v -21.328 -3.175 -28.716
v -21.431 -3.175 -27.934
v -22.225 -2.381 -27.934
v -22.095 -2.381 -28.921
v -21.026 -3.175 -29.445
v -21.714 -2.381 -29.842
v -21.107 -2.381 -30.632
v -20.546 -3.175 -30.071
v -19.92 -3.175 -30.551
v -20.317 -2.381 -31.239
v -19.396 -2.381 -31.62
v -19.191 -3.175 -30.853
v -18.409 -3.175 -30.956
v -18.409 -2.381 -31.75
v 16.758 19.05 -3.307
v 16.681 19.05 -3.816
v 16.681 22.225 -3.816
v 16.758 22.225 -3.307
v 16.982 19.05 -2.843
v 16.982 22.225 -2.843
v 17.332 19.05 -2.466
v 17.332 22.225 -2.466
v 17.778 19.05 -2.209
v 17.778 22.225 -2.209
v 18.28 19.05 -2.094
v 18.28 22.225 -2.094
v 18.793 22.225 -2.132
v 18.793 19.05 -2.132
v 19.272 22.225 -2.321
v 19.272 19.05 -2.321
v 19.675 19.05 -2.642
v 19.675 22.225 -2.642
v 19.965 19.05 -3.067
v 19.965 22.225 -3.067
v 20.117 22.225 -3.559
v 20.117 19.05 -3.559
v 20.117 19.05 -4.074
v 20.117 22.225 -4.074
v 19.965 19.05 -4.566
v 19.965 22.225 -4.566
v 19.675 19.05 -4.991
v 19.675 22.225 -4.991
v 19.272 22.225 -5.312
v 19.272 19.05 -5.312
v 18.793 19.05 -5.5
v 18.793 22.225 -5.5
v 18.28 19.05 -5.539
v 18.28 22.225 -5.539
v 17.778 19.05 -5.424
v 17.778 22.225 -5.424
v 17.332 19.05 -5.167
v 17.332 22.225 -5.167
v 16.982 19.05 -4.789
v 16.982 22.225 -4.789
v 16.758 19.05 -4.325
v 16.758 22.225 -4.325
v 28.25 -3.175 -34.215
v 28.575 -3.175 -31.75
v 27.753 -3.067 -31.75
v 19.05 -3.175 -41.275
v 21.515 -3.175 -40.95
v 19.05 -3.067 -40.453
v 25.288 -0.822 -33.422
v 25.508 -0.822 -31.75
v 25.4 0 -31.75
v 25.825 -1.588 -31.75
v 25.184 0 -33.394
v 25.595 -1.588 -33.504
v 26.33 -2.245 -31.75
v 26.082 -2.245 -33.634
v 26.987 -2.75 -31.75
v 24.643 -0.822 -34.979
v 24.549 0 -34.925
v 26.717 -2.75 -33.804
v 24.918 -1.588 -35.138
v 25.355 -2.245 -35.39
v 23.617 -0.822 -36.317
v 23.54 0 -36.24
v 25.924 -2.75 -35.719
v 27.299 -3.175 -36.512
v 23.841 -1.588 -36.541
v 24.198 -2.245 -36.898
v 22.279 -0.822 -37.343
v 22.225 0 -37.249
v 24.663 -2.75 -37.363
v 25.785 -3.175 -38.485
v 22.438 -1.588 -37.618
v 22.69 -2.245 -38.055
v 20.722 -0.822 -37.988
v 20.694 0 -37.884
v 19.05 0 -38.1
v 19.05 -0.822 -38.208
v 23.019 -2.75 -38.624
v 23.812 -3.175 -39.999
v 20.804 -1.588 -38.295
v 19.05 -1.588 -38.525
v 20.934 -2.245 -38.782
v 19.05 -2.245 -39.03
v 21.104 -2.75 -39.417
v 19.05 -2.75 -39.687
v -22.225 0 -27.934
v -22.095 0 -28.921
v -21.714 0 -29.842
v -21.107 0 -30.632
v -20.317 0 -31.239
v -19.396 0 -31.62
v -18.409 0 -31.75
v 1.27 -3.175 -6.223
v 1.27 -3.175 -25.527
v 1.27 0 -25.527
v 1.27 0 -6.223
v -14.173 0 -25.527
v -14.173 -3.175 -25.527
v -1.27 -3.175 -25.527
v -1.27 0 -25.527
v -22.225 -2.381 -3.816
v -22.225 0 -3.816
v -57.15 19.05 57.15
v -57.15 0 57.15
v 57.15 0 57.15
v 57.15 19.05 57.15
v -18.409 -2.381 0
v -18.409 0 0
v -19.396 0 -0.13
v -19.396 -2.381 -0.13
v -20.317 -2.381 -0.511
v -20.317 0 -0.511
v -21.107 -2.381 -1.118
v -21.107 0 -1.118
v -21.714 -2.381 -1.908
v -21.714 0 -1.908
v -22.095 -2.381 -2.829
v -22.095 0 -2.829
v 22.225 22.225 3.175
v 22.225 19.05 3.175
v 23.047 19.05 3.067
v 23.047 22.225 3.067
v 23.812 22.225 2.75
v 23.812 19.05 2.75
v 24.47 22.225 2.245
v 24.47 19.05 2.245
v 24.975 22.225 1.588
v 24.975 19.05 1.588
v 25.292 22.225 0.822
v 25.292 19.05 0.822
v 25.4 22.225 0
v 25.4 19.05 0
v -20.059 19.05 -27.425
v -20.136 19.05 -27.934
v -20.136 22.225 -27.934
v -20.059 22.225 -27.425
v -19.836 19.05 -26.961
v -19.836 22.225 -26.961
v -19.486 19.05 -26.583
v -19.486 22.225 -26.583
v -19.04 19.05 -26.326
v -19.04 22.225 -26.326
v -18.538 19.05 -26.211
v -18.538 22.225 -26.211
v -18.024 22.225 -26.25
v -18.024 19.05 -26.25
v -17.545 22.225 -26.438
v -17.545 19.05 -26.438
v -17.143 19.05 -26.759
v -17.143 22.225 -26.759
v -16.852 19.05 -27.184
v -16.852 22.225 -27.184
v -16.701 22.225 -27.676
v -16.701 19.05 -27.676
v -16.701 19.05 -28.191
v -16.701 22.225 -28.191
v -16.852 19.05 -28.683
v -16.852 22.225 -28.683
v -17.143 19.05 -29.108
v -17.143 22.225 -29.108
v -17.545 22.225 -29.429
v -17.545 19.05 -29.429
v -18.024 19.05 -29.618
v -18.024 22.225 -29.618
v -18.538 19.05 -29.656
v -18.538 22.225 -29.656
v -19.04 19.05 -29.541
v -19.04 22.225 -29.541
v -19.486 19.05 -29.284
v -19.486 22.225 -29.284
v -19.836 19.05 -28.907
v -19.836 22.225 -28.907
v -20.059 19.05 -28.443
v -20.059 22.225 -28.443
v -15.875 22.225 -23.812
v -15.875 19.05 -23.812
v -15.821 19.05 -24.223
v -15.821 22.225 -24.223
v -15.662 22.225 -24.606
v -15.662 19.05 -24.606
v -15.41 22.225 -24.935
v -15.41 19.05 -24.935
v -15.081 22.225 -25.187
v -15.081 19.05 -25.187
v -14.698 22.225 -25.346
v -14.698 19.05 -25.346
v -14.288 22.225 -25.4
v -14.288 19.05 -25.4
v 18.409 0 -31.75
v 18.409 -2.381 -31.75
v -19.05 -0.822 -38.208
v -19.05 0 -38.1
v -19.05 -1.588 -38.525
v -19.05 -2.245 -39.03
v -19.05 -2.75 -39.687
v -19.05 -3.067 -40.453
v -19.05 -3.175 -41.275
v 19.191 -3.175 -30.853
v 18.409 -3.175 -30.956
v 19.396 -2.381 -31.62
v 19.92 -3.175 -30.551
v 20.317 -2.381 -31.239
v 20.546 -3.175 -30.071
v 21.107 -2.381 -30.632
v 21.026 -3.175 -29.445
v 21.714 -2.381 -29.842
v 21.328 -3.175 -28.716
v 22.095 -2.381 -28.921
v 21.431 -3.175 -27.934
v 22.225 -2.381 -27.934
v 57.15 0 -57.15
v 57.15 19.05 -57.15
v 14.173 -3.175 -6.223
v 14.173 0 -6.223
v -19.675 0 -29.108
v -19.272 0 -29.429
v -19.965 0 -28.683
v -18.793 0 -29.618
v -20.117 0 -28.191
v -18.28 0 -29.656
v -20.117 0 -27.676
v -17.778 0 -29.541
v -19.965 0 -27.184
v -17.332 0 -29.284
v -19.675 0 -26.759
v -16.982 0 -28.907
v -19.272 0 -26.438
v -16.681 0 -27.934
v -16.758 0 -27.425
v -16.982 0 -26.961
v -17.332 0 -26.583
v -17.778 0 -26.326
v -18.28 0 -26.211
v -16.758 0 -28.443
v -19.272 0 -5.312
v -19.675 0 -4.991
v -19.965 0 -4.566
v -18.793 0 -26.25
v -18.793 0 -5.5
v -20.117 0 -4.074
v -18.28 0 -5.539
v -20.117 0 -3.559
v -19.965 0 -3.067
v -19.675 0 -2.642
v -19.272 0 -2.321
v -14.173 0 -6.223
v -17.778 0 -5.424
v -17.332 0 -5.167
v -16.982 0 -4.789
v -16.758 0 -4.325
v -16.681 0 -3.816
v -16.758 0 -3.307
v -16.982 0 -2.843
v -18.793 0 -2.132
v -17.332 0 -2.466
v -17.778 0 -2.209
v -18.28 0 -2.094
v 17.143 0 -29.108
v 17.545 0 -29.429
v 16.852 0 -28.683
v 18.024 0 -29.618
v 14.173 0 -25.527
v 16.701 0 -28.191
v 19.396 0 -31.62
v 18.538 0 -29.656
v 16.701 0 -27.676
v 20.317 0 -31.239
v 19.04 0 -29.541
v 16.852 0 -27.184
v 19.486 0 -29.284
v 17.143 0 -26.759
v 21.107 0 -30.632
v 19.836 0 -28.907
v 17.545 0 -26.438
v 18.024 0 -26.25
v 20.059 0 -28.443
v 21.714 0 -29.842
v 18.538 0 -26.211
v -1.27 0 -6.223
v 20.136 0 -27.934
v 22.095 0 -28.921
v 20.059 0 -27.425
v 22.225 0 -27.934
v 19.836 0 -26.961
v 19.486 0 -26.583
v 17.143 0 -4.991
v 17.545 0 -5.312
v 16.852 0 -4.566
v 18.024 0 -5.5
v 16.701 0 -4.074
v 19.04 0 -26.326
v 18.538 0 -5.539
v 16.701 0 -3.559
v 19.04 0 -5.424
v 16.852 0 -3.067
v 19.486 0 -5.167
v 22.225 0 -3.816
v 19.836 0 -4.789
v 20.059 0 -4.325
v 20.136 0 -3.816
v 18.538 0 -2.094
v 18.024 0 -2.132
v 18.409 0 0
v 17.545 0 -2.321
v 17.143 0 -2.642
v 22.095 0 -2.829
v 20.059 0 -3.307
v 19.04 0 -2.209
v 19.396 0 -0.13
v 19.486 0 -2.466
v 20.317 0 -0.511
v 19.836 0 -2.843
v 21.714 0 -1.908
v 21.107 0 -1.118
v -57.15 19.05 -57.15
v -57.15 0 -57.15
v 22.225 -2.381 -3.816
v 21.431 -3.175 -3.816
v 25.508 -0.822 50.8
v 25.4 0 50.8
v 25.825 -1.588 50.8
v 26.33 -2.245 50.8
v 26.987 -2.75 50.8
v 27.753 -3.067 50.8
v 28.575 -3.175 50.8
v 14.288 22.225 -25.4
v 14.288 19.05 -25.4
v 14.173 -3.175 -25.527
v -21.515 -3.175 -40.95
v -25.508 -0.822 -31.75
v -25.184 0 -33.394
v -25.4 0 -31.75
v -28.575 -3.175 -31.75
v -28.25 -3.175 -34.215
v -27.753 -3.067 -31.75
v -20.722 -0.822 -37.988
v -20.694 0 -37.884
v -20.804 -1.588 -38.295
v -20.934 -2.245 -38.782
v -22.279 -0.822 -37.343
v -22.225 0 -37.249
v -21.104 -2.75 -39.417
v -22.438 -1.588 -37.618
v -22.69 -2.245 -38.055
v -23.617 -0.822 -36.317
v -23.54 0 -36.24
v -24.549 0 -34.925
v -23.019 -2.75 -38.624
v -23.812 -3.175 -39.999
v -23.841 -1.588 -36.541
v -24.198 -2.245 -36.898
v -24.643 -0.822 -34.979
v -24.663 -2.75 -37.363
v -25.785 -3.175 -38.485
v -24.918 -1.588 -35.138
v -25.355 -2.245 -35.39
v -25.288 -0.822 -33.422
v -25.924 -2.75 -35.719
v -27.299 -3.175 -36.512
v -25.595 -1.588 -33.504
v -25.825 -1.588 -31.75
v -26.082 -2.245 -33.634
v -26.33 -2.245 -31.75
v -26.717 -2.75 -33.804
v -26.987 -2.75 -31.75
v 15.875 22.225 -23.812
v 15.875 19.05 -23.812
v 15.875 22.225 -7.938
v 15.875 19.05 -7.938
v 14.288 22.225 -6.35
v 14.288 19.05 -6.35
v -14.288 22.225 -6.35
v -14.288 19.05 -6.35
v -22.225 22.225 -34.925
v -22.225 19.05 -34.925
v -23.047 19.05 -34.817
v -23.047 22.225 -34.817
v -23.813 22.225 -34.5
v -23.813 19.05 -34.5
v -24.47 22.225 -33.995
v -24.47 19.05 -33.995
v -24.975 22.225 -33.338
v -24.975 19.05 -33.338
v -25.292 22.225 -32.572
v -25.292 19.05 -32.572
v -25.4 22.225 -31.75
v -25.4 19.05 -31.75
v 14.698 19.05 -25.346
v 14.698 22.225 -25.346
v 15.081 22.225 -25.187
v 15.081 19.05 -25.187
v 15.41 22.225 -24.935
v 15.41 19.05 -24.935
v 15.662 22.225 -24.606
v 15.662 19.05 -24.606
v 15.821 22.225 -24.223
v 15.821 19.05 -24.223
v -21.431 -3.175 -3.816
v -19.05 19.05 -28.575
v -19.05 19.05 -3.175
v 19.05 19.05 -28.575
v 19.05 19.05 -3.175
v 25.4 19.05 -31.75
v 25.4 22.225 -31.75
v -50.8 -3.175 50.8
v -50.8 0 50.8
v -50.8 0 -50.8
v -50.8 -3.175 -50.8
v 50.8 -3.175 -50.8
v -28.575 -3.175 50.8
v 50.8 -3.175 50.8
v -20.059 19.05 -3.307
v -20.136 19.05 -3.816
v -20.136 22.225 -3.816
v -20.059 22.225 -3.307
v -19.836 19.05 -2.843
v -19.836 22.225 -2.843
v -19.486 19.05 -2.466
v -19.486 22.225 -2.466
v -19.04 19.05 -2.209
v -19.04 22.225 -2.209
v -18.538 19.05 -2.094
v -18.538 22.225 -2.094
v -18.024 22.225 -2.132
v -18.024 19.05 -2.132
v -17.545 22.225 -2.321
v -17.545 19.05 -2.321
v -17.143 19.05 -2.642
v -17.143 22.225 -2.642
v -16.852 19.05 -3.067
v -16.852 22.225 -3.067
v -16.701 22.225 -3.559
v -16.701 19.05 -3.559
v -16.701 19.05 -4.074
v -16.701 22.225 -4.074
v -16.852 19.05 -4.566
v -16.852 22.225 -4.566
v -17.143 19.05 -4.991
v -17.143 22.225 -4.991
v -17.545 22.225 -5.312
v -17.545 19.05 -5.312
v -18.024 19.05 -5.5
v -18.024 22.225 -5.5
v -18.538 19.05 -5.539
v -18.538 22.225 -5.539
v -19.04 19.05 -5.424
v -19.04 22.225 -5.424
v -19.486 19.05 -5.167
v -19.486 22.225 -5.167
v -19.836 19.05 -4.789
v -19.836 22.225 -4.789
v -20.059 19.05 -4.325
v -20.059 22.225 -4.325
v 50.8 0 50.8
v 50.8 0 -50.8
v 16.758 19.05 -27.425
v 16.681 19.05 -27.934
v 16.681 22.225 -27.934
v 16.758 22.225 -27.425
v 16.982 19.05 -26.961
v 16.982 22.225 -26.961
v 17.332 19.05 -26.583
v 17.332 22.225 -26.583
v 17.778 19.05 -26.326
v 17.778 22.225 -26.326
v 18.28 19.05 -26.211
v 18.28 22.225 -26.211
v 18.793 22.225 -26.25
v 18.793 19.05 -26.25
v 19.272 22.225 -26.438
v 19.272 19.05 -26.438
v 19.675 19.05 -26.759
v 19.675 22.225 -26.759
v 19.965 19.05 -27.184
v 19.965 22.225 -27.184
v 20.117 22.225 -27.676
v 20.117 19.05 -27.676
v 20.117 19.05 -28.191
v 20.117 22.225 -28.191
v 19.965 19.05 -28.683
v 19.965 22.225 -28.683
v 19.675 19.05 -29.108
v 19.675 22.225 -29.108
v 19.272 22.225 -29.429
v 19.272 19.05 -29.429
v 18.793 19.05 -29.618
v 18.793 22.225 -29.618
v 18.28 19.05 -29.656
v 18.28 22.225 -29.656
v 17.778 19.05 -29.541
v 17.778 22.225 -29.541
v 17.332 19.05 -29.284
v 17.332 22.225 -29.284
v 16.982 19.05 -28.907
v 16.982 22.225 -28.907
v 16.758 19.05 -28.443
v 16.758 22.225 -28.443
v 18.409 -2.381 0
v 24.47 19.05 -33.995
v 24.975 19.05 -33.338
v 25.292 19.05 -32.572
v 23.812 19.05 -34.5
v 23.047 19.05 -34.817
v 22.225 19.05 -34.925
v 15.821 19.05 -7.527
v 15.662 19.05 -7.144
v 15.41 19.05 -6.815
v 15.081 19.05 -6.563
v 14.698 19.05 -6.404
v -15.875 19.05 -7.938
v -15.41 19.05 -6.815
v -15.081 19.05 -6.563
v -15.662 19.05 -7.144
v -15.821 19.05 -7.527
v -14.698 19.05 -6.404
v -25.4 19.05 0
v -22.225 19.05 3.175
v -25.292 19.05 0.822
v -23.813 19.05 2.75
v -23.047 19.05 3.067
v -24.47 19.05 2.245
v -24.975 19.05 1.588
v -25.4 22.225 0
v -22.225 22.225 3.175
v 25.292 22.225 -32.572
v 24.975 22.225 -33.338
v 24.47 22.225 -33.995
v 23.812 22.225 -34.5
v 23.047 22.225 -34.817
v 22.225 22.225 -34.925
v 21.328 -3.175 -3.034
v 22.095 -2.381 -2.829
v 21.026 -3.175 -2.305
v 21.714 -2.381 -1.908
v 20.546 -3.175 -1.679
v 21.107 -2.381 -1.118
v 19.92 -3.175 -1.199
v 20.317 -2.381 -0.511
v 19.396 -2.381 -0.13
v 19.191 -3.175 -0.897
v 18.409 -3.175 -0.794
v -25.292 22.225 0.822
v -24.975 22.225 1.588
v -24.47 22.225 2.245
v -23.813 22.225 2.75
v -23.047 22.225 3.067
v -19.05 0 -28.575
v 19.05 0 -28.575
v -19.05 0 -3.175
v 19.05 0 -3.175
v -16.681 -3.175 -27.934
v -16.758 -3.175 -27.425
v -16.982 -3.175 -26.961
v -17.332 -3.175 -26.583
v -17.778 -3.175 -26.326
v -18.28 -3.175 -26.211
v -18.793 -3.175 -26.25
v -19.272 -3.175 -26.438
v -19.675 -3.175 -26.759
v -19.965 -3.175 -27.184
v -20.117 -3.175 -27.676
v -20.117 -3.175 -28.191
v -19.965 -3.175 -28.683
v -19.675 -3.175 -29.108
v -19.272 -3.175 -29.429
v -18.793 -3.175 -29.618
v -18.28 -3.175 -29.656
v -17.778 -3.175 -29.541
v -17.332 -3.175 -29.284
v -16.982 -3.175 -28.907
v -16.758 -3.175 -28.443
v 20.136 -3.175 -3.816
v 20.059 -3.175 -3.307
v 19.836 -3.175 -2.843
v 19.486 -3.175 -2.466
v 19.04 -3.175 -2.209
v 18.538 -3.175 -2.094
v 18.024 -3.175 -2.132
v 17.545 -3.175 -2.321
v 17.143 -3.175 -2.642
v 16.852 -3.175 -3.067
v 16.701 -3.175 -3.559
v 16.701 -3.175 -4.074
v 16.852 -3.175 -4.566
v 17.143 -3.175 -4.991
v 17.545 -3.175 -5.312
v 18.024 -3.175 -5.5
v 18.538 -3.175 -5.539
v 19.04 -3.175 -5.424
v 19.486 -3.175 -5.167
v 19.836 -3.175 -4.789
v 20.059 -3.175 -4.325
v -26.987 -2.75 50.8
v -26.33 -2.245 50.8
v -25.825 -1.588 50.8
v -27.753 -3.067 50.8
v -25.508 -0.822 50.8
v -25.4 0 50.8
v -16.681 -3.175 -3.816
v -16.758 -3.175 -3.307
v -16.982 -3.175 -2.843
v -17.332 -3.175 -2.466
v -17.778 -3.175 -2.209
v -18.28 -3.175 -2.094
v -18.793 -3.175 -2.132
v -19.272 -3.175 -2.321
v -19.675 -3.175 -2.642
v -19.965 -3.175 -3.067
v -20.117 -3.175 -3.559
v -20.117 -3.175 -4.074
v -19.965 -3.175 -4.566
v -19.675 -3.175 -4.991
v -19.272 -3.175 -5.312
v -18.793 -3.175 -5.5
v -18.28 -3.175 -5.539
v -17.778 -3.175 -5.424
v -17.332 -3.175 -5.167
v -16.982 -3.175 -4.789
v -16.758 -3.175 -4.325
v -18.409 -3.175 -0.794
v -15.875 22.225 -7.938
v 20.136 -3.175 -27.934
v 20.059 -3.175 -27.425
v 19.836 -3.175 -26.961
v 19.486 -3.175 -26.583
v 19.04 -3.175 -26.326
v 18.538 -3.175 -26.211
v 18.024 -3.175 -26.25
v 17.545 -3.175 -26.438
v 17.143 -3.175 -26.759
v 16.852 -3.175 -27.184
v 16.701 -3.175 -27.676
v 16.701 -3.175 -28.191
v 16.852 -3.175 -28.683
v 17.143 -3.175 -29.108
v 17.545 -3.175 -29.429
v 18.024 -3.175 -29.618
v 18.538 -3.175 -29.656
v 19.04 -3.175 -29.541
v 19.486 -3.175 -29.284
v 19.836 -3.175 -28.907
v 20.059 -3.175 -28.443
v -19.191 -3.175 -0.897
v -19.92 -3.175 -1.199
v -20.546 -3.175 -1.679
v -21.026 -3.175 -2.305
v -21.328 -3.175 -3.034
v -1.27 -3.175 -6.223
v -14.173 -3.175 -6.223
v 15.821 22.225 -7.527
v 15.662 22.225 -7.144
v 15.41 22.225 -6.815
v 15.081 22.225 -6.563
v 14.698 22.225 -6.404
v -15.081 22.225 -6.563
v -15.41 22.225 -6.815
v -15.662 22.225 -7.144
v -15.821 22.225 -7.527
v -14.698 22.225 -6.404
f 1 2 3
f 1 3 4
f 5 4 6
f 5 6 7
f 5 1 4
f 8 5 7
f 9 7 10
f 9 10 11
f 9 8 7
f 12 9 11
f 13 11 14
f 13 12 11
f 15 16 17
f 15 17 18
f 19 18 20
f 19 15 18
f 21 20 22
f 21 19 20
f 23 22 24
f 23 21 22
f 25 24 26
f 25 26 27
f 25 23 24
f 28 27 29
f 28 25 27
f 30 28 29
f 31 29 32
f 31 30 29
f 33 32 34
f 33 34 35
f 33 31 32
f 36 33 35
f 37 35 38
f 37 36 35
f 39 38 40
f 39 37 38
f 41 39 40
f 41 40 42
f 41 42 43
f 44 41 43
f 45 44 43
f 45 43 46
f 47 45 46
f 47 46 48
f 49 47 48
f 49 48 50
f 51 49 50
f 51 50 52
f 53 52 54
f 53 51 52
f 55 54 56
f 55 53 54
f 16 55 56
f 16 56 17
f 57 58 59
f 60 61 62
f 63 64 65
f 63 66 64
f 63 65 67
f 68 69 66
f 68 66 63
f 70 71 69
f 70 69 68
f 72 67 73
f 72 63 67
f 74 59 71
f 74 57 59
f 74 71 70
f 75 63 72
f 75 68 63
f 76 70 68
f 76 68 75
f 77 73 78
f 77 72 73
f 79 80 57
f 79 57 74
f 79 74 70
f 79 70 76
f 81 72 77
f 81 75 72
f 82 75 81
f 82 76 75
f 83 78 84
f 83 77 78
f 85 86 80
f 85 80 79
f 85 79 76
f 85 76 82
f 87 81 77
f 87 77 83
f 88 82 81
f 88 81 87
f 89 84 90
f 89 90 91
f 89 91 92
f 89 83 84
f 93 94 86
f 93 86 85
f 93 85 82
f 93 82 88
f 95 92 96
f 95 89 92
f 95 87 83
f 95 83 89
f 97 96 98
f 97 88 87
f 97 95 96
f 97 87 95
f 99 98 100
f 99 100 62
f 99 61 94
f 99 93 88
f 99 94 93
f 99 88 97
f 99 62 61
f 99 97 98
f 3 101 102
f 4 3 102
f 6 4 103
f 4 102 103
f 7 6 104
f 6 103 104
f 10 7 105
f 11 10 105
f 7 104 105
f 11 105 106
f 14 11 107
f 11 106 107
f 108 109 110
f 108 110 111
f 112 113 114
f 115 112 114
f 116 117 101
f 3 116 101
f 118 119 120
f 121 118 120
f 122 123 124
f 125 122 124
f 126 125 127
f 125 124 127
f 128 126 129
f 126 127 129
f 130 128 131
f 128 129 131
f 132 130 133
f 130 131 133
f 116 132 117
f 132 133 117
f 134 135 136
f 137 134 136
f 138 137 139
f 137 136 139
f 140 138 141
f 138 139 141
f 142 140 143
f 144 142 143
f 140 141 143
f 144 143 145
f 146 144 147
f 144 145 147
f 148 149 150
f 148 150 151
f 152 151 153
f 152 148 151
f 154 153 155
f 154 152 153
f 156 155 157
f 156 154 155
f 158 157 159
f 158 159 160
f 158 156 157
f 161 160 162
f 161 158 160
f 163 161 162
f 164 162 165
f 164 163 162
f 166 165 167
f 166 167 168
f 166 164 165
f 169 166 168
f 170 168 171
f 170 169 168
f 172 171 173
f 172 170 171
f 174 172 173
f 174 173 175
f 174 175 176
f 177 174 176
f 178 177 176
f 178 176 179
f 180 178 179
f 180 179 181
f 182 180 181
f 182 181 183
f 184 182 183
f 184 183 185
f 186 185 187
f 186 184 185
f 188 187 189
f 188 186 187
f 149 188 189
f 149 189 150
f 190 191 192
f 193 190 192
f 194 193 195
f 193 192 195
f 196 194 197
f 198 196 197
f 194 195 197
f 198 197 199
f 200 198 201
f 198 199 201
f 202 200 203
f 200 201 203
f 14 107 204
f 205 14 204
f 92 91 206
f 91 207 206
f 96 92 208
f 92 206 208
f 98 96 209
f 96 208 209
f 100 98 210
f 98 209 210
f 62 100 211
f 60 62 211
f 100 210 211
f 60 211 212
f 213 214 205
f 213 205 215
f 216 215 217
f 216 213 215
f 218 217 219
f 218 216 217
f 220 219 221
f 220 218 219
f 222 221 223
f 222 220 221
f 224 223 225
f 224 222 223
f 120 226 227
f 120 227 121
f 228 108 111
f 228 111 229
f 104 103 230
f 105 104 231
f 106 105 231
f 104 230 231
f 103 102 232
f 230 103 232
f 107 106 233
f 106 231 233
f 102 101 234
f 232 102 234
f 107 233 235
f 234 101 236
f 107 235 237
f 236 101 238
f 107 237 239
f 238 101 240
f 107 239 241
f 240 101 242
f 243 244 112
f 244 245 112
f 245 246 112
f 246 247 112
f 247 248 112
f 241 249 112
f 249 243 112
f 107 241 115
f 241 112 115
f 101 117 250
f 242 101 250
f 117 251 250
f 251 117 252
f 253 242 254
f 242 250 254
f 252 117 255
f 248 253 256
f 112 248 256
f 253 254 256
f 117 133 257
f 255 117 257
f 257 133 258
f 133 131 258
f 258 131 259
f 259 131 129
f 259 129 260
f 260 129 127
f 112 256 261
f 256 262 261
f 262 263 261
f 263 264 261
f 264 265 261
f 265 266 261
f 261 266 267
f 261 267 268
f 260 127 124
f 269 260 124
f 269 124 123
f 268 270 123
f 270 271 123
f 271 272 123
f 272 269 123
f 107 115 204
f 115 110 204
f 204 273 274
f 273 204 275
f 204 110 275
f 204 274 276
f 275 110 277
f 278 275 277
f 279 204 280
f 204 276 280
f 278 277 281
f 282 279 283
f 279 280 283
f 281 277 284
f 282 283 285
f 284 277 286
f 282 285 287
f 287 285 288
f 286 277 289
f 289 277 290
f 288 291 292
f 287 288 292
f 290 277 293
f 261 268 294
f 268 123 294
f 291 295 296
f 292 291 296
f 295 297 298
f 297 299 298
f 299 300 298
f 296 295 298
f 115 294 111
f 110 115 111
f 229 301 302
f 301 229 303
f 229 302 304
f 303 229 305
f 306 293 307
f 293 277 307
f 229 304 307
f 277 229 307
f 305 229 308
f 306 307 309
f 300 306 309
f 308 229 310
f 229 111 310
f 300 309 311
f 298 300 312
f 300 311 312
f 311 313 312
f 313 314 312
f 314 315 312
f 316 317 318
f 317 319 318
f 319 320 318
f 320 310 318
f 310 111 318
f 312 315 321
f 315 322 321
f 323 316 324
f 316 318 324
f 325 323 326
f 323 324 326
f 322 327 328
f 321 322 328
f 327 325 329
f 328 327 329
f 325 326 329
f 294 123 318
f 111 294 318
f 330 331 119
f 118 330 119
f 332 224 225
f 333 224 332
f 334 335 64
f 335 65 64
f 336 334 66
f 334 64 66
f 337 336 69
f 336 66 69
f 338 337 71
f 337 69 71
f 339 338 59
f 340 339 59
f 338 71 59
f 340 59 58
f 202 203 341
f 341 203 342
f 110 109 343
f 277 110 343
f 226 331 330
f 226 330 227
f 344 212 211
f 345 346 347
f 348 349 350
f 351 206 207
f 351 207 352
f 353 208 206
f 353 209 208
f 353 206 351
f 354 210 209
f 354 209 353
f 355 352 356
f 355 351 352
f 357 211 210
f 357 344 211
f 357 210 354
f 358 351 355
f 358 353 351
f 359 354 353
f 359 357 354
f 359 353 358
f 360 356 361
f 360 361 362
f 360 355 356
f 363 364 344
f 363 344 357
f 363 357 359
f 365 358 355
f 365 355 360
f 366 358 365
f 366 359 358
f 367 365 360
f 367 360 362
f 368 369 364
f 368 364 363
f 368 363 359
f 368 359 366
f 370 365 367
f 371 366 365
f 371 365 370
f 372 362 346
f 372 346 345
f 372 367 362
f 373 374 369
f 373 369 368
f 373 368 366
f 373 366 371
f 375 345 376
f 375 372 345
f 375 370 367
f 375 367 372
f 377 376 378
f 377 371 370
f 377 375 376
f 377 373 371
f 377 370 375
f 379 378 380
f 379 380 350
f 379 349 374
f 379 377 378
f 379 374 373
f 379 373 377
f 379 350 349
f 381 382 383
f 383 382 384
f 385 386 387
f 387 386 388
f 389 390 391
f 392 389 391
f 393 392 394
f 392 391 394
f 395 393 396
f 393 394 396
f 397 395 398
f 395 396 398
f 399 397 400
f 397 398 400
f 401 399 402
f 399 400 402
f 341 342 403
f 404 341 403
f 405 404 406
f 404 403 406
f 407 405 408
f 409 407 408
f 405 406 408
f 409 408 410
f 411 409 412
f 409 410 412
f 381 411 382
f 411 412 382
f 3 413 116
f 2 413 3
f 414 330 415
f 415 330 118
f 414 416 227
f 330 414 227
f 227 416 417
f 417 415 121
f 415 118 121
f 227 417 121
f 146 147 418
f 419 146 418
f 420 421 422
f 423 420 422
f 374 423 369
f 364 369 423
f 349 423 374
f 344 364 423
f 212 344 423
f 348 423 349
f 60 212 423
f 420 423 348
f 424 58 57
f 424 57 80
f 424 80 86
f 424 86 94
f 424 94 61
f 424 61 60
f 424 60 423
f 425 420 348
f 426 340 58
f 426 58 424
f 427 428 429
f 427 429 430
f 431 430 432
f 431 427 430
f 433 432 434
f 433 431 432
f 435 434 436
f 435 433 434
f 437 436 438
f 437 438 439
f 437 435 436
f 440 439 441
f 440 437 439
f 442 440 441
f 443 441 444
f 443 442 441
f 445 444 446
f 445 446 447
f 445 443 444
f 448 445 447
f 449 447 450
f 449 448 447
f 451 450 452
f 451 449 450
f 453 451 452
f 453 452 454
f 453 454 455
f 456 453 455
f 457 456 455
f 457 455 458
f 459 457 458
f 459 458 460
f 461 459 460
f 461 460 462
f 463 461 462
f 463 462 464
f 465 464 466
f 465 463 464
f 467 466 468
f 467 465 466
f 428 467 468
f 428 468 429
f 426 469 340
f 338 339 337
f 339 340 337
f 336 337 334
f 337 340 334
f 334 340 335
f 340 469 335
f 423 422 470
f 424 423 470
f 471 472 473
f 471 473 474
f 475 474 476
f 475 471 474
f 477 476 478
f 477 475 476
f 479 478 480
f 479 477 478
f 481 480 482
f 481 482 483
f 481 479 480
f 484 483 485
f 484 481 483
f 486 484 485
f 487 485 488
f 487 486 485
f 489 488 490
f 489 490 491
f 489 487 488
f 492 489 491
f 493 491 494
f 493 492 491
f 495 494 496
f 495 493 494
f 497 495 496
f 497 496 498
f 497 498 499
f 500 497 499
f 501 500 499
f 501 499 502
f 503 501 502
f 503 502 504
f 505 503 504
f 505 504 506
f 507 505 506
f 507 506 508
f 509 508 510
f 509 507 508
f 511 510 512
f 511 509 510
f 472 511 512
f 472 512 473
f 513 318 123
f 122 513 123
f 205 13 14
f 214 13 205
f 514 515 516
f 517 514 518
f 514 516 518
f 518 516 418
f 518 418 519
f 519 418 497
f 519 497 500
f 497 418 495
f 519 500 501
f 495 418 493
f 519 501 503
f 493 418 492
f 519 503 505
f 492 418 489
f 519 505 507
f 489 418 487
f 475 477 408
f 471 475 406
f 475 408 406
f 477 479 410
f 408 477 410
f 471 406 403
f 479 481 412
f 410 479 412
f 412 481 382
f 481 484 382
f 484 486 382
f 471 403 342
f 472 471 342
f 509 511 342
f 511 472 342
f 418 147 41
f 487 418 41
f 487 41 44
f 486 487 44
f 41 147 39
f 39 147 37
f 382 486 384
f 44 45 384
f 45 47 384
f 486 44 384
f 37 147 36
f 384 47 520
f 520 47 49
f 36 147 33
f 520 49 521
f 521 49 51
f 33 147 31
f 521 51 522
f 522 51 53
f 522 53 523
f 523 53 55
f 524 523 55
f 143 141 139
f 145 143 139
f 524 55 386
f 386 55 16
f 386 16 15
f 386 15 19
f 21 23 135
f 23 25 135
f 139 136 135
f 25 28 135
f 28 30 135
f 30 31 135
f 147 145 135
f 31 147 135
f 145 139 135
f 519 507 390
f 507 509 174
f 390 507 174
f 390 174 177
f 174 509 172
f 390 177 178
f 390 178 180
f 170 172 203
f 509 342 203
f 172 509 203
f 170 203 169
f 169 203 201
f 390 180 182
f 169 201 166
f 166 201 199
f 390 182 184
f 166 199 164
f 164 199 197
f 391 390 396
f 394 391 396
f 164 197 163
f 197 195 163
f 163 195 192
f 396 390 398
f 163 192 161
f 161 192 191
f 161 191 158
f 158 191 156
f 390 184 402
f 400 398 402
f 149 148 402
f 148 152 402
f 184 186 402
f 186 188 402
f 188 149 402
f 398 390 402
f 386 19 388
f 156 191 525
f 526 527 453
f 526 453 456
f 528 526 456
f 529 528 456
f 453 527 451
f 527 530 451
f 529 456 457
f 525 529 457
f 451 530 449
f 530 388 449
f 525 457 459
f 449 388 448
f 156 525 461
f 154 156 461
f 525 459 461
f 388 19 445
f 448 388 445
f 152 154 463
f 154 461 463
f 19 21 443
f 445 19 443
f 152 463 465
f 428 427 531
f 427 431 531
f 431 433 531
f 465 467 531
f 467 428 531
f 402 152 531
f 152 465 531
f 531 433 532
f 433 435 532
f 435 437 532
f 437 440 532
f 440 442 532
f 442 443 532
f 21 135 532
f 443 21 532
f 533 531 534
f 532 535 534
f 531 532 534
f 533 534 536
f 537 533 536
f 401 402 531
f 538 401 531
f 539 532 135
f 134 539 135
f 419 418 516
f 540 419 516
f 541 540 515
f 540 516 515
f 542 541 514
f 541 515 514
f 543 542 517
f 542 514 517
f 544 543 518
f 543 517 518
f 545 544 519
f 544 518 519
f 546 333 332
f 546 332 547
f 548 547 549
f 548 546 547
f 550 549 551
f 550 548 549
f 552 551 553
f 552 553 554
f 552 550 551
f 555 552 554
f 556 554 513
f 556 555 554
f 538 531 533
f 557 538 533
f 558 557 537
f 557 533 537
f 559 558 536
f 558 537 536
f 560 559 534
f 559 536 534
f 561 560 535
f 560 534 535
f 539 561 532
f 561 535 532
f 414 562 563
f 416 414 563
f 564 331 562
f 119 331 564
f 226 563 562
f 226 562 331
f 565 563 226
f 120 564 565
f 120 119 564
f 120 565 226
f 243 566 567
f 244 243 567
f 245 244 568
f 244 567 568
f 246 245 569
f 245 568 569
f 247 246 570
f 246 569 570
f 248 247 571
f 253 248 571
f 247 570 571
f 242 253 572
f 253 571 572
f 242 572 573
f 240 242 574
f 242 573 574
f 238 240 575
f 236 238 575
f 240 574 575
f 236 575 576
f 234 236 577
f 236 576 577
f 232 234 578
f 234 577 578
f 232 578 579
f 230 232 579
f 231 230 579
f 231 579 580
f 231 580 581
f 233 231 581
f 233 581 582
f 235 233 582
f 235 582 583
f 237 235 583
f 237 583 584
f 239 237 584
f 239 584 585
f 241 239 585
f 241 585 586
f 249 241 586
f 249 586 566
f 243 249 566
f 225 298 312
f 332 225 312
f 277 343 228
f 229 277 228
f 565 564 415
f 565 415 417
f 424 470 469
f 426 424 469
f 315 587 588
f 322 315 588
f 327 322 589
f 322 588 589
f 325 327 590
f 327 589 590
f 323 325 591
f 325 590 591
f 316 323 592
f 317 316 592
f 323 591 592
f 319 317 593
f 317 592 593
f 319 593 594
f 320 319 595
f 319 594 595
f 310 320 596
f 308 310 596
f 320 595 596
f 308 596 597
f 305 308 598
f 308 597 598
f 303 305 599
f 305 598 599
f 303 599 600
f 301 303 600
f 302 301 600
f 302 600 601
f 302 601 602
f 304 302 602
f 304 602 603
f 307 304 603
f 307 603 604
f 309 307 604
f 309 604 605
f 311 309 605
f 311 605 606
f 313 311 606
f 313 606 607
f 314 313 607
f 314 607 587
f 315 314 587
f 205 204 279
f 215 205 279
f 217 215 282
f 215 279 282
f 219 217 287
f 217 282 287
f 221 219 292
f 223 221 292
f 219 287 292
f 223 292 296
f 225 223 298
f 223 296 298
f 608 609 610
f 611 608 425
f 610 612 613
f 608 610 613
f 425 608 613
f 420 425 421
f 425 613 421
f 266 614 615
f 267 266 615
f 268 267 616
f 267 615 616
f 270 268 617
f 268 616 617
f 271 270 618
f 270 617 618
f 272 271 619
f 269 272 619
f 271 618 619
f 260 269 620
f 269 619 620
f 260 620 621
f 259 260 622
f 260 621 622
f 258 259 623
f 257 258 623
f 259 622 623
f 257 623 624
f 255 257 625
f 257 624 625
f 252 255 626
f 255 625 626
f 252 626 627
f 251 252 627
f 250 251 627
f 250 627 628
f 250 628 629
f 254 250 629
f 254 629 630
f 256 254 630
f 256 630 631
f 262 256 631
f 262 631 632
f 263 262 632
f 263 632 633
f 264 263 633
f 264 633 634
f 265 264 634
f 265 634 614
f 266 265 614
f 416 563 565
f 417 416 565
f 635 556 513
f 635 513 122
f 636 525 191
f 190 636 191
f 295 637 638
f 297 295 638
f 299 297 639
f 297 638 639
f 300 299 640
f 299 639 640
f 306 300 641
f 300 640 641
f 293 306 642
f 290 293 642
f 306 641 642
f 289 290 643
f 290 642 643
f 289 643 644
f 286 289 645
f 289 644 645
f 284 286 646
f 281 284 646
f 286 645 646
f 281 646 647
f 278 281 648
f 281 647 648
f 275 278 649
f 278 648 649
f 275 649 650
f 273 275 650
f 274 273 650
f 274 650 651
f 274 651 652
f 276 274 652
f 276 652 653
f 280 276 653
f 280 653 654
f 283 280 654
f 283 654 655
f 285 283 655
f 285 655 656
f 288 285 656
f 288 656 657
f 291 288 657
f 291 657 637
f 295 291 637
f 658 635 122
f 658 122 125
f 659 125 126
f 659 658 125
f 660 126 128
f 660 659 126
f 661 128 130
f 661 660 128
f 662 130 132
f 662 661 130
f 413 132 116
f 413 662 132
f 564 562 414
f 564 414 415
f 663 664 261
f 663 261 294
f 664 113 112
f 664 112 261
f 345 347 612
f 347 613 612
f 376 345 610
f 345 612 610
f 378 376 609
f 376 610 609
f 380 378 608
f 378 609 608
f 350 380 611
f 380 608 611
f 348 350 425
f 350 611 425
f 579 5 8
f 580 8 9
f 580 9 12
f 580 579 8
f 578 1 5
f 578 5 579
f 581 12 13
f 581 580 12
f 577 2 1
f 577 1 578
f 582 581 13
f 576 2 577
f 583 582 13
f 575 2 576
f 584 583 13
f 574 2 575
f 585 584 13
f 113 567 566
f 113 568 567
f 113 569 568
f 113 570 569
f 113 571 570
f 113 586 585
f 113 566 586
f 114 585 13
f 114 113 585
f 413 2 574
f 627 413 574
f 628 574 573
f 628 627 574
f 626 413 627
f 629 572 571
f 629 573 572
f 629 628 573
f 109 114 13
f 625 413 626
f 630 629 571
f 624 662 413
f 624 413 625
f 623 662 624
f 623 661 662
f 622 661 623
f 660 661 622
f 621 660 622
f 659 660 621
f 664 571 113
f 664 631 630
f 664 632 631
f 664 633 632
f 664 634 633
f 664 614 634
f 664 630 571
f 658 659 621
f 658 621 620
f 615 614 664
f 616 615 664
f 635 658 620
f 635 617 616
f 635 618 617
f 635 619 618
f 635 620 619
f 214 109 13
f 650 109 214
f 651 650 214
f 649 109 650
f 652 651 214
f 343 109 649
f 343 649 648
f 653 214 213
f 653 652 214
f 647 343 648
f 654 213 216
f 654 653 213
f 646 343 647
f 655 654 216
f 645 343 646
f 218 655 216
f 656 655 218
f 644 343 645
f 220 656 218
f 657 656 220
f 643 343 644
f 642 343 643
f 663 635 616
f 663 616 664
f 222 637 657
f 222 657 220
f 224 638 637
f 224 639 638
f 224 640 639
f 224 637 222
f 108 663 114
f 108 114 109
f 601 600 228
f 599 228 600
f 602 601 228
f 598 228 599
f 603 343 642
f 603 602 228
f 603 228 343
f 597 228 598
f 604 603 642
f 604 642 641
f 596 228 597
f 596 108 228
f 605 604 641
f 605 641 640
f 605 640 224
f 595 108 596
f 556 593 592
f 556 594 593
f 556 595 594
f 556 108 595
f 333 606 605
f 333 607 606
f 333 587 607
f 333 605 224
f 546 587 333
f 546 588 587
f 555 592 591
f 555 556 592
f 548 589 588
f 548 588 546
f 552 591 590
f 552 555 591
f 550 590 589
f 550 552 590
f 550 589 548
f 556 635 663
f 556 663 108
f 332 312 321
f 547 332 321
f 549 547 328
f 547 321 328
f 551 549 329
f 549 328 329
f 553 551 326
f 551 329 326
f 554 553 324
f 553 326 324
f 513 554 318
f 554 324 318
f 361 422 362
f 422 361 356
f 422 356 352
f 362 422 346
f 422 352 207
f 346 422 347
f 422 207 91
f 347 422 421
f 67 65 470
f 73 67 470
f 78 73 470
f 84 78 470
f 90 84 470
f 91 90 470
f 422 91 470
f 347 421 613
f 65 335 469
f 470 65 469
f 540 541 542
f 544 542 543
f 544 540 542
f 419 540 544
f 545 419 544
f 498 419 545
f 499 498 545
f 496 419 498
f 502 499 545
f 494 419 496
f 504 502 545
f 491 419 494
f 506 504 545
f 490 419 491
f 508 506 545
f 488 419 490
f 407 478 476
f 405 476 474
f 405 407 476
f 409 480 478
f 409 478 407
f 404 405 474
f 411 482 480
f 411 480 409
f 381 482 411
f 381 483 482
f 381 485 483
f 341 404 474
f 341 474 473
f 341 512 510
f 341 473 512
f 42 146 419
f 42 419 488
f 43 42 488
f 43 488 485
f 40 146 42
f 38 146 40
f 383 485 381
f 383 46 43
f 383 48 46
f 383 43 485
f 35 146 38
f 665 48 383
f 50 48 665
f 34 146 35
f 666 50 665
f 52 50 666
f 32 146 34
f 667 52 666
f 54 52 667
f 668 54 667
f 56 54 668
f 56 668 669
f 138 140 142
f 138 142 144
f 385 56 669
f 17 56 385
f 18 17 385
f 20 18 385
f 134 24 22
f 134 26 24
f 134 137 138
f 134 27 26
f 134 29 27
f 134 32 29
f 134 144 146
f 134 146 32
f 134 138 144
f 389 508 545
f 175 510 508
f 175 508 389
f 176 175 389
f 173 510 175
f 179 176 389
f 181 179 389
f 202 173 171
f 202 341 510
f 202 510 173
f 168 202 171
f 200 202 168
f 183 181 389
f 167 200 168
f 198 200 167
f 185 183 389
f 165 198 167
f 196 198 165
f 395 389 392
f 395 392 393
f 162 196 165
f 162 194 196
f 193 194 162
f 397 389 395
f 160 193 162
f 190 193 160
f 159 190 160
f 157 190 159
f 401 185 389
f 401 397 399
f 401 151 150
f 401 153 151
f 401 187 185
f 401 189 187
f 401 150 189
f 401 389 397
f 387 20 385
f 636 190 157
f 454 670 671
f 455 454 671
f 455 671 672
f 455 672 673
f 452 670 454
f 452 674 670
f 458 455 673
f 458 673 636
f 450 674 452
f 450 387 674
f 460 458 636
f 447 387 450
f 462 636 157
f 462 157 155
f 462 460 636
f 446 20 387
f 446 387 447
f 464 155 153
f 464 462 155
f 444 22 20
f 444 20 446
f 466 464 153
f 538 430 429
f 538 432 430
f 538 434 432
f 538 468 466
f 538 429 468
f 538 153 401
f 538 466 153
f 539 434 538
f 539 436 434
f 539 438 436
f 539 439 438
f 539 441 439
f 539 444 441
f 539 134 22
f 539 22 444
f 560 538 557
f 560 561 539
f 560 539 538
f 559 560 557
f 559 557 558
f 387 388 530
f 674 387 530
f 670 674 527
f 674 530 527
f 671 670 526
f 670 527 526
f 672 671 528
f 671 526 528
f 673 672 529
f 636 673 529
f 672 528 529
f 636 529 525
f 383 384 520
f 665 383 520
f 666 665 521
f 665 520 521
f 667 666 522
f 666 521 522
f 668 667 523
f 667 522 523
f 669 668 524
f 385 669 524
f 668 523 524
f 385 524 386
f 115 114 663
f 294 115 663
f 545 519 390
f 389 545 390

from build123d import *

# Parameters (mm, degrees)
F0_W      = 114.3
F0_H      = 114.3
F1_DEPTH  = 19.05
F3_DEPTH  = 3.175
F4_R      = 3.17499
F5_W      = 38.1
F5_H      = 25.4
F6_DEPTH  = 19.051
F8_DEPTH  = 3.175
F9_SIZE   = 0.79375
F10_W     = 12.9032
F10_H     = 19.304
F11_DEPTH = 22.226
F12_R     = 1.7272
F13_DEPTH = 22.226
F14_R     = 1.7272
F15_DEPTH = 3.175


# Not quite as in the source:
# - a fillet or chamfer is up to 0.001 mm smaller than in the source, because OpenCascade refuses the exact size


with BuildPart() as f1:
    # F0 (on Front) → F1 (new body)
    with BuildSketch(Plane.XZ):
        Rectangle(F0_W, F0_H)
    extrude(amount=-F1_DEPTH)

    # F5 (on Front) → F6 (cut, through all)
    with BuildSketch(Plane.XZ):
        with Locations((0, -15.875)):
            Rectangle(F5_W, F5_H)
    extrude(amount=-F6_DEPTH, mode=Mode.SUBTRACT)


with BuildPart() as f3:
    # F2 (on Front) → F3 (new body)
    with BuildSketch(Plane.XZ):
        with BuildLine():
            Line((-50.8, 50.8), (-50.8, -50.8))
            Line((-50.8, -50.8), (50.8, -50.8))
            Line((50.8, -50.8), (50.8, 50.8))
            Line((50.8, 50.8), (25.4, 50.8))
            Line((25.4, 50.8), (25.4, -31.75))
            ThreePointArc((25.4, -31.75), (23.5401280605, -36.2401280605), (19.05, -38.1))
            Line((19.05, -38.1), (-19.05, -38.1))
            ThreePointArc((-19.05, -38.1), (-23.5401280605, -36.2401280605), (-25.4, -31.75))
            Line((-25.4, -31.75), (-25.4, 50.8))
            Line((-25.4, 50.8), (-50.8, 50.8))
        make_face()
    extrude(amount=F3_DEPTH)

    # F4 (radius 3.175 in the source; OpenCascade refuses exactly that, so slightly less here)
    f4_edges = [f3.edges().sort_by_distance(p)[0] for p in [
        (-25.4, -3.175, 9.525),
        (25.4, -3.175, 9.525),
        (23.540128, -3.175, -36.240128),
        (0, -3.175, -38.1),
        (-23.540128, -3.175, -36.240128),
    ]]
    fillet(f4_edges, radius=F4_R)


with BuildPart() as f8:
    # F7 (on Front) → F8 (new body)
    with BuildSketch(Plane.XZ):
        with BuildLine():
            Line((18.40865, 0), (-18.40865, 0))
            ThreePointArc((-18.40865, 0), (-21.1072169644, -1.1177830356), (-22.225, -3.81635))
            Line((-22.225, -3.81635), (-22.225, -27.93365))
            ThreePointArc((-22.225, -27.93365), (-21.1072169644, -30.6322169644), (-18.40865, -31.75))
            Line((-18.40865, -31.75), (18.40865, -31.75))
            ThreePointArc((18.40865, -31.75), (21.1072169644, -30.6322169644), (22.225, -27.93365))
            Line((22.225, -27.93365), (22.225, -3.81635))
            ThreePointArc((22.225, -3.81635), (21.1072169644, -1.1177830356), (18.40865, 0))
        make_face()
    extrude(amount=F8_DEPTH)

    # F9
    f9_edges = [f8.edges().sort_by_distance(p)[0] for p in [
        (0, -3.175, 0),
        (-21.107217, -3.175, -1.117783),
        (-22.225, -3.175, -15.875),
        (-21.107217, -3.175, -30.632217),
        (0, -3.175, -31.75),
        (21.107217, -3.175, -30.632217),
        (22.225, -3.175, -15.875),
        (21.107217, -3.175, -1.117783),
    ]]
    chamfer(f9_edges, length=F9_SIZE)

    # F10 (on face) → F11 (cut, through all)
    with BuildSketch(Plane.XZ.offset(3.175)):
        with Locations((-7.7216, -15.875)):
            Rectangle(F10_W, F10_H)
        with Locations((7.7216, -15.875)):
            Rectangle(F10_W, F10_H)
    extrude(amount=-F11_DEPTH, mode=Mode.SUBTRACT)

    # F12 (on face) → F13 (cut, through all)
    with BuildSketch(Plane.XZ.offset(3.175)):
        with Locations((-18.40865, -3.81635)):
            Circle(F12_R)
        with Locations((-18.40865, -27.93365)):
            Circle(F12_R)
        with Locations((18.40865, -3.81635)):
            Circle(F12_R)
        with Locations((18.40865, -27.93365)):
            Circle(F12_R)
    extrude(amount=-F13_DEPTH, mode=Mode.SUBTRACT)


with BuildPart() as f15:
    # F14 (on face) → F15 (new body)
    with BuildSketch(Plane(origin=(0, 19.05, 0), x_dir=(-1, 0, 0), z_dir=(0, 1, 0))):
        with BuildLine():
            Line((22.2250037253, 3.175), (-22.2249962747, 3.175))
            ThreePointArc((-22.2249962747, 3.175), (-24.470060305, 2.2450640303), (-25.3999962747, 0))
            Line((-25.3999962747, 0), (-25.3999962747, -31.75))
            ThreePointArc((-25.3999962747, -31.75), (-24.470060305, -33.9950640303), (-22.2249962747, -34.925))
            Line((-22.2249962747, -34.925), (22.2250037253, -34.925))
            ThreePointArc((22.2250037253, -34.925), (24.4700677556, -33.9950640303), (25.4000037253, -31.75))
            Line((25.4000037253, -31.75), (25.4000037253, 0))
            ThreePointArc((25.4000037253, 0), (24.4700677556, 2.2450640303), (22.2250037253, 3.175))
        make_face()
        with Locations((-18.40865, -27.93365)):
            Circle(F14_R, mode=Mode.SUBTRACT)
        with Locations((18.40865, -27.93365)):
            Circle(F14_R, mode=Mode.SUBTRACT)
        with BuildLine():
            ThreePointArc((-15.875, -7.9375), (-15.4100320151, -6.8149679849), (-14.2875, -6.35))
            Line((-14.2875, -6.35), (14.2875, -6.35))
            ThreePointArc((14.2875, -6.35), (15.4100320151, -6.8149679849), (15.875, -7.9375))
            Line((15.875, -7.9375), (15.875, -23.8125))
            ThreePointArc((15.875, -23.8125), (15.4100320151, -24.9350320151), (14.2875, -25.4))
            Line((14.2875, -25.4), (-14.2875, -25.4))
            ThreePointArc((-14.2875, -25.4), (-15.4100320151, -24.9350320151), (-15.875, -23.8125))
            Line((-15.875, -23.8125), (-15.875, -7.9375))
        make_face(mode=Mode.SUBTRACT)
        with Locations((-18.40865, -3.81635)):
            Circle(F14_R, mode=Mode.SUBTRACT)
        with Locations((18.40865, -3.81635)):
            Circle(F14_R, mode=Mode.SUBTRACT)
    extrude(amount=F15_DEPTH)


solid = Compound([f1.part, f3.part, f8.part, f15.part])
